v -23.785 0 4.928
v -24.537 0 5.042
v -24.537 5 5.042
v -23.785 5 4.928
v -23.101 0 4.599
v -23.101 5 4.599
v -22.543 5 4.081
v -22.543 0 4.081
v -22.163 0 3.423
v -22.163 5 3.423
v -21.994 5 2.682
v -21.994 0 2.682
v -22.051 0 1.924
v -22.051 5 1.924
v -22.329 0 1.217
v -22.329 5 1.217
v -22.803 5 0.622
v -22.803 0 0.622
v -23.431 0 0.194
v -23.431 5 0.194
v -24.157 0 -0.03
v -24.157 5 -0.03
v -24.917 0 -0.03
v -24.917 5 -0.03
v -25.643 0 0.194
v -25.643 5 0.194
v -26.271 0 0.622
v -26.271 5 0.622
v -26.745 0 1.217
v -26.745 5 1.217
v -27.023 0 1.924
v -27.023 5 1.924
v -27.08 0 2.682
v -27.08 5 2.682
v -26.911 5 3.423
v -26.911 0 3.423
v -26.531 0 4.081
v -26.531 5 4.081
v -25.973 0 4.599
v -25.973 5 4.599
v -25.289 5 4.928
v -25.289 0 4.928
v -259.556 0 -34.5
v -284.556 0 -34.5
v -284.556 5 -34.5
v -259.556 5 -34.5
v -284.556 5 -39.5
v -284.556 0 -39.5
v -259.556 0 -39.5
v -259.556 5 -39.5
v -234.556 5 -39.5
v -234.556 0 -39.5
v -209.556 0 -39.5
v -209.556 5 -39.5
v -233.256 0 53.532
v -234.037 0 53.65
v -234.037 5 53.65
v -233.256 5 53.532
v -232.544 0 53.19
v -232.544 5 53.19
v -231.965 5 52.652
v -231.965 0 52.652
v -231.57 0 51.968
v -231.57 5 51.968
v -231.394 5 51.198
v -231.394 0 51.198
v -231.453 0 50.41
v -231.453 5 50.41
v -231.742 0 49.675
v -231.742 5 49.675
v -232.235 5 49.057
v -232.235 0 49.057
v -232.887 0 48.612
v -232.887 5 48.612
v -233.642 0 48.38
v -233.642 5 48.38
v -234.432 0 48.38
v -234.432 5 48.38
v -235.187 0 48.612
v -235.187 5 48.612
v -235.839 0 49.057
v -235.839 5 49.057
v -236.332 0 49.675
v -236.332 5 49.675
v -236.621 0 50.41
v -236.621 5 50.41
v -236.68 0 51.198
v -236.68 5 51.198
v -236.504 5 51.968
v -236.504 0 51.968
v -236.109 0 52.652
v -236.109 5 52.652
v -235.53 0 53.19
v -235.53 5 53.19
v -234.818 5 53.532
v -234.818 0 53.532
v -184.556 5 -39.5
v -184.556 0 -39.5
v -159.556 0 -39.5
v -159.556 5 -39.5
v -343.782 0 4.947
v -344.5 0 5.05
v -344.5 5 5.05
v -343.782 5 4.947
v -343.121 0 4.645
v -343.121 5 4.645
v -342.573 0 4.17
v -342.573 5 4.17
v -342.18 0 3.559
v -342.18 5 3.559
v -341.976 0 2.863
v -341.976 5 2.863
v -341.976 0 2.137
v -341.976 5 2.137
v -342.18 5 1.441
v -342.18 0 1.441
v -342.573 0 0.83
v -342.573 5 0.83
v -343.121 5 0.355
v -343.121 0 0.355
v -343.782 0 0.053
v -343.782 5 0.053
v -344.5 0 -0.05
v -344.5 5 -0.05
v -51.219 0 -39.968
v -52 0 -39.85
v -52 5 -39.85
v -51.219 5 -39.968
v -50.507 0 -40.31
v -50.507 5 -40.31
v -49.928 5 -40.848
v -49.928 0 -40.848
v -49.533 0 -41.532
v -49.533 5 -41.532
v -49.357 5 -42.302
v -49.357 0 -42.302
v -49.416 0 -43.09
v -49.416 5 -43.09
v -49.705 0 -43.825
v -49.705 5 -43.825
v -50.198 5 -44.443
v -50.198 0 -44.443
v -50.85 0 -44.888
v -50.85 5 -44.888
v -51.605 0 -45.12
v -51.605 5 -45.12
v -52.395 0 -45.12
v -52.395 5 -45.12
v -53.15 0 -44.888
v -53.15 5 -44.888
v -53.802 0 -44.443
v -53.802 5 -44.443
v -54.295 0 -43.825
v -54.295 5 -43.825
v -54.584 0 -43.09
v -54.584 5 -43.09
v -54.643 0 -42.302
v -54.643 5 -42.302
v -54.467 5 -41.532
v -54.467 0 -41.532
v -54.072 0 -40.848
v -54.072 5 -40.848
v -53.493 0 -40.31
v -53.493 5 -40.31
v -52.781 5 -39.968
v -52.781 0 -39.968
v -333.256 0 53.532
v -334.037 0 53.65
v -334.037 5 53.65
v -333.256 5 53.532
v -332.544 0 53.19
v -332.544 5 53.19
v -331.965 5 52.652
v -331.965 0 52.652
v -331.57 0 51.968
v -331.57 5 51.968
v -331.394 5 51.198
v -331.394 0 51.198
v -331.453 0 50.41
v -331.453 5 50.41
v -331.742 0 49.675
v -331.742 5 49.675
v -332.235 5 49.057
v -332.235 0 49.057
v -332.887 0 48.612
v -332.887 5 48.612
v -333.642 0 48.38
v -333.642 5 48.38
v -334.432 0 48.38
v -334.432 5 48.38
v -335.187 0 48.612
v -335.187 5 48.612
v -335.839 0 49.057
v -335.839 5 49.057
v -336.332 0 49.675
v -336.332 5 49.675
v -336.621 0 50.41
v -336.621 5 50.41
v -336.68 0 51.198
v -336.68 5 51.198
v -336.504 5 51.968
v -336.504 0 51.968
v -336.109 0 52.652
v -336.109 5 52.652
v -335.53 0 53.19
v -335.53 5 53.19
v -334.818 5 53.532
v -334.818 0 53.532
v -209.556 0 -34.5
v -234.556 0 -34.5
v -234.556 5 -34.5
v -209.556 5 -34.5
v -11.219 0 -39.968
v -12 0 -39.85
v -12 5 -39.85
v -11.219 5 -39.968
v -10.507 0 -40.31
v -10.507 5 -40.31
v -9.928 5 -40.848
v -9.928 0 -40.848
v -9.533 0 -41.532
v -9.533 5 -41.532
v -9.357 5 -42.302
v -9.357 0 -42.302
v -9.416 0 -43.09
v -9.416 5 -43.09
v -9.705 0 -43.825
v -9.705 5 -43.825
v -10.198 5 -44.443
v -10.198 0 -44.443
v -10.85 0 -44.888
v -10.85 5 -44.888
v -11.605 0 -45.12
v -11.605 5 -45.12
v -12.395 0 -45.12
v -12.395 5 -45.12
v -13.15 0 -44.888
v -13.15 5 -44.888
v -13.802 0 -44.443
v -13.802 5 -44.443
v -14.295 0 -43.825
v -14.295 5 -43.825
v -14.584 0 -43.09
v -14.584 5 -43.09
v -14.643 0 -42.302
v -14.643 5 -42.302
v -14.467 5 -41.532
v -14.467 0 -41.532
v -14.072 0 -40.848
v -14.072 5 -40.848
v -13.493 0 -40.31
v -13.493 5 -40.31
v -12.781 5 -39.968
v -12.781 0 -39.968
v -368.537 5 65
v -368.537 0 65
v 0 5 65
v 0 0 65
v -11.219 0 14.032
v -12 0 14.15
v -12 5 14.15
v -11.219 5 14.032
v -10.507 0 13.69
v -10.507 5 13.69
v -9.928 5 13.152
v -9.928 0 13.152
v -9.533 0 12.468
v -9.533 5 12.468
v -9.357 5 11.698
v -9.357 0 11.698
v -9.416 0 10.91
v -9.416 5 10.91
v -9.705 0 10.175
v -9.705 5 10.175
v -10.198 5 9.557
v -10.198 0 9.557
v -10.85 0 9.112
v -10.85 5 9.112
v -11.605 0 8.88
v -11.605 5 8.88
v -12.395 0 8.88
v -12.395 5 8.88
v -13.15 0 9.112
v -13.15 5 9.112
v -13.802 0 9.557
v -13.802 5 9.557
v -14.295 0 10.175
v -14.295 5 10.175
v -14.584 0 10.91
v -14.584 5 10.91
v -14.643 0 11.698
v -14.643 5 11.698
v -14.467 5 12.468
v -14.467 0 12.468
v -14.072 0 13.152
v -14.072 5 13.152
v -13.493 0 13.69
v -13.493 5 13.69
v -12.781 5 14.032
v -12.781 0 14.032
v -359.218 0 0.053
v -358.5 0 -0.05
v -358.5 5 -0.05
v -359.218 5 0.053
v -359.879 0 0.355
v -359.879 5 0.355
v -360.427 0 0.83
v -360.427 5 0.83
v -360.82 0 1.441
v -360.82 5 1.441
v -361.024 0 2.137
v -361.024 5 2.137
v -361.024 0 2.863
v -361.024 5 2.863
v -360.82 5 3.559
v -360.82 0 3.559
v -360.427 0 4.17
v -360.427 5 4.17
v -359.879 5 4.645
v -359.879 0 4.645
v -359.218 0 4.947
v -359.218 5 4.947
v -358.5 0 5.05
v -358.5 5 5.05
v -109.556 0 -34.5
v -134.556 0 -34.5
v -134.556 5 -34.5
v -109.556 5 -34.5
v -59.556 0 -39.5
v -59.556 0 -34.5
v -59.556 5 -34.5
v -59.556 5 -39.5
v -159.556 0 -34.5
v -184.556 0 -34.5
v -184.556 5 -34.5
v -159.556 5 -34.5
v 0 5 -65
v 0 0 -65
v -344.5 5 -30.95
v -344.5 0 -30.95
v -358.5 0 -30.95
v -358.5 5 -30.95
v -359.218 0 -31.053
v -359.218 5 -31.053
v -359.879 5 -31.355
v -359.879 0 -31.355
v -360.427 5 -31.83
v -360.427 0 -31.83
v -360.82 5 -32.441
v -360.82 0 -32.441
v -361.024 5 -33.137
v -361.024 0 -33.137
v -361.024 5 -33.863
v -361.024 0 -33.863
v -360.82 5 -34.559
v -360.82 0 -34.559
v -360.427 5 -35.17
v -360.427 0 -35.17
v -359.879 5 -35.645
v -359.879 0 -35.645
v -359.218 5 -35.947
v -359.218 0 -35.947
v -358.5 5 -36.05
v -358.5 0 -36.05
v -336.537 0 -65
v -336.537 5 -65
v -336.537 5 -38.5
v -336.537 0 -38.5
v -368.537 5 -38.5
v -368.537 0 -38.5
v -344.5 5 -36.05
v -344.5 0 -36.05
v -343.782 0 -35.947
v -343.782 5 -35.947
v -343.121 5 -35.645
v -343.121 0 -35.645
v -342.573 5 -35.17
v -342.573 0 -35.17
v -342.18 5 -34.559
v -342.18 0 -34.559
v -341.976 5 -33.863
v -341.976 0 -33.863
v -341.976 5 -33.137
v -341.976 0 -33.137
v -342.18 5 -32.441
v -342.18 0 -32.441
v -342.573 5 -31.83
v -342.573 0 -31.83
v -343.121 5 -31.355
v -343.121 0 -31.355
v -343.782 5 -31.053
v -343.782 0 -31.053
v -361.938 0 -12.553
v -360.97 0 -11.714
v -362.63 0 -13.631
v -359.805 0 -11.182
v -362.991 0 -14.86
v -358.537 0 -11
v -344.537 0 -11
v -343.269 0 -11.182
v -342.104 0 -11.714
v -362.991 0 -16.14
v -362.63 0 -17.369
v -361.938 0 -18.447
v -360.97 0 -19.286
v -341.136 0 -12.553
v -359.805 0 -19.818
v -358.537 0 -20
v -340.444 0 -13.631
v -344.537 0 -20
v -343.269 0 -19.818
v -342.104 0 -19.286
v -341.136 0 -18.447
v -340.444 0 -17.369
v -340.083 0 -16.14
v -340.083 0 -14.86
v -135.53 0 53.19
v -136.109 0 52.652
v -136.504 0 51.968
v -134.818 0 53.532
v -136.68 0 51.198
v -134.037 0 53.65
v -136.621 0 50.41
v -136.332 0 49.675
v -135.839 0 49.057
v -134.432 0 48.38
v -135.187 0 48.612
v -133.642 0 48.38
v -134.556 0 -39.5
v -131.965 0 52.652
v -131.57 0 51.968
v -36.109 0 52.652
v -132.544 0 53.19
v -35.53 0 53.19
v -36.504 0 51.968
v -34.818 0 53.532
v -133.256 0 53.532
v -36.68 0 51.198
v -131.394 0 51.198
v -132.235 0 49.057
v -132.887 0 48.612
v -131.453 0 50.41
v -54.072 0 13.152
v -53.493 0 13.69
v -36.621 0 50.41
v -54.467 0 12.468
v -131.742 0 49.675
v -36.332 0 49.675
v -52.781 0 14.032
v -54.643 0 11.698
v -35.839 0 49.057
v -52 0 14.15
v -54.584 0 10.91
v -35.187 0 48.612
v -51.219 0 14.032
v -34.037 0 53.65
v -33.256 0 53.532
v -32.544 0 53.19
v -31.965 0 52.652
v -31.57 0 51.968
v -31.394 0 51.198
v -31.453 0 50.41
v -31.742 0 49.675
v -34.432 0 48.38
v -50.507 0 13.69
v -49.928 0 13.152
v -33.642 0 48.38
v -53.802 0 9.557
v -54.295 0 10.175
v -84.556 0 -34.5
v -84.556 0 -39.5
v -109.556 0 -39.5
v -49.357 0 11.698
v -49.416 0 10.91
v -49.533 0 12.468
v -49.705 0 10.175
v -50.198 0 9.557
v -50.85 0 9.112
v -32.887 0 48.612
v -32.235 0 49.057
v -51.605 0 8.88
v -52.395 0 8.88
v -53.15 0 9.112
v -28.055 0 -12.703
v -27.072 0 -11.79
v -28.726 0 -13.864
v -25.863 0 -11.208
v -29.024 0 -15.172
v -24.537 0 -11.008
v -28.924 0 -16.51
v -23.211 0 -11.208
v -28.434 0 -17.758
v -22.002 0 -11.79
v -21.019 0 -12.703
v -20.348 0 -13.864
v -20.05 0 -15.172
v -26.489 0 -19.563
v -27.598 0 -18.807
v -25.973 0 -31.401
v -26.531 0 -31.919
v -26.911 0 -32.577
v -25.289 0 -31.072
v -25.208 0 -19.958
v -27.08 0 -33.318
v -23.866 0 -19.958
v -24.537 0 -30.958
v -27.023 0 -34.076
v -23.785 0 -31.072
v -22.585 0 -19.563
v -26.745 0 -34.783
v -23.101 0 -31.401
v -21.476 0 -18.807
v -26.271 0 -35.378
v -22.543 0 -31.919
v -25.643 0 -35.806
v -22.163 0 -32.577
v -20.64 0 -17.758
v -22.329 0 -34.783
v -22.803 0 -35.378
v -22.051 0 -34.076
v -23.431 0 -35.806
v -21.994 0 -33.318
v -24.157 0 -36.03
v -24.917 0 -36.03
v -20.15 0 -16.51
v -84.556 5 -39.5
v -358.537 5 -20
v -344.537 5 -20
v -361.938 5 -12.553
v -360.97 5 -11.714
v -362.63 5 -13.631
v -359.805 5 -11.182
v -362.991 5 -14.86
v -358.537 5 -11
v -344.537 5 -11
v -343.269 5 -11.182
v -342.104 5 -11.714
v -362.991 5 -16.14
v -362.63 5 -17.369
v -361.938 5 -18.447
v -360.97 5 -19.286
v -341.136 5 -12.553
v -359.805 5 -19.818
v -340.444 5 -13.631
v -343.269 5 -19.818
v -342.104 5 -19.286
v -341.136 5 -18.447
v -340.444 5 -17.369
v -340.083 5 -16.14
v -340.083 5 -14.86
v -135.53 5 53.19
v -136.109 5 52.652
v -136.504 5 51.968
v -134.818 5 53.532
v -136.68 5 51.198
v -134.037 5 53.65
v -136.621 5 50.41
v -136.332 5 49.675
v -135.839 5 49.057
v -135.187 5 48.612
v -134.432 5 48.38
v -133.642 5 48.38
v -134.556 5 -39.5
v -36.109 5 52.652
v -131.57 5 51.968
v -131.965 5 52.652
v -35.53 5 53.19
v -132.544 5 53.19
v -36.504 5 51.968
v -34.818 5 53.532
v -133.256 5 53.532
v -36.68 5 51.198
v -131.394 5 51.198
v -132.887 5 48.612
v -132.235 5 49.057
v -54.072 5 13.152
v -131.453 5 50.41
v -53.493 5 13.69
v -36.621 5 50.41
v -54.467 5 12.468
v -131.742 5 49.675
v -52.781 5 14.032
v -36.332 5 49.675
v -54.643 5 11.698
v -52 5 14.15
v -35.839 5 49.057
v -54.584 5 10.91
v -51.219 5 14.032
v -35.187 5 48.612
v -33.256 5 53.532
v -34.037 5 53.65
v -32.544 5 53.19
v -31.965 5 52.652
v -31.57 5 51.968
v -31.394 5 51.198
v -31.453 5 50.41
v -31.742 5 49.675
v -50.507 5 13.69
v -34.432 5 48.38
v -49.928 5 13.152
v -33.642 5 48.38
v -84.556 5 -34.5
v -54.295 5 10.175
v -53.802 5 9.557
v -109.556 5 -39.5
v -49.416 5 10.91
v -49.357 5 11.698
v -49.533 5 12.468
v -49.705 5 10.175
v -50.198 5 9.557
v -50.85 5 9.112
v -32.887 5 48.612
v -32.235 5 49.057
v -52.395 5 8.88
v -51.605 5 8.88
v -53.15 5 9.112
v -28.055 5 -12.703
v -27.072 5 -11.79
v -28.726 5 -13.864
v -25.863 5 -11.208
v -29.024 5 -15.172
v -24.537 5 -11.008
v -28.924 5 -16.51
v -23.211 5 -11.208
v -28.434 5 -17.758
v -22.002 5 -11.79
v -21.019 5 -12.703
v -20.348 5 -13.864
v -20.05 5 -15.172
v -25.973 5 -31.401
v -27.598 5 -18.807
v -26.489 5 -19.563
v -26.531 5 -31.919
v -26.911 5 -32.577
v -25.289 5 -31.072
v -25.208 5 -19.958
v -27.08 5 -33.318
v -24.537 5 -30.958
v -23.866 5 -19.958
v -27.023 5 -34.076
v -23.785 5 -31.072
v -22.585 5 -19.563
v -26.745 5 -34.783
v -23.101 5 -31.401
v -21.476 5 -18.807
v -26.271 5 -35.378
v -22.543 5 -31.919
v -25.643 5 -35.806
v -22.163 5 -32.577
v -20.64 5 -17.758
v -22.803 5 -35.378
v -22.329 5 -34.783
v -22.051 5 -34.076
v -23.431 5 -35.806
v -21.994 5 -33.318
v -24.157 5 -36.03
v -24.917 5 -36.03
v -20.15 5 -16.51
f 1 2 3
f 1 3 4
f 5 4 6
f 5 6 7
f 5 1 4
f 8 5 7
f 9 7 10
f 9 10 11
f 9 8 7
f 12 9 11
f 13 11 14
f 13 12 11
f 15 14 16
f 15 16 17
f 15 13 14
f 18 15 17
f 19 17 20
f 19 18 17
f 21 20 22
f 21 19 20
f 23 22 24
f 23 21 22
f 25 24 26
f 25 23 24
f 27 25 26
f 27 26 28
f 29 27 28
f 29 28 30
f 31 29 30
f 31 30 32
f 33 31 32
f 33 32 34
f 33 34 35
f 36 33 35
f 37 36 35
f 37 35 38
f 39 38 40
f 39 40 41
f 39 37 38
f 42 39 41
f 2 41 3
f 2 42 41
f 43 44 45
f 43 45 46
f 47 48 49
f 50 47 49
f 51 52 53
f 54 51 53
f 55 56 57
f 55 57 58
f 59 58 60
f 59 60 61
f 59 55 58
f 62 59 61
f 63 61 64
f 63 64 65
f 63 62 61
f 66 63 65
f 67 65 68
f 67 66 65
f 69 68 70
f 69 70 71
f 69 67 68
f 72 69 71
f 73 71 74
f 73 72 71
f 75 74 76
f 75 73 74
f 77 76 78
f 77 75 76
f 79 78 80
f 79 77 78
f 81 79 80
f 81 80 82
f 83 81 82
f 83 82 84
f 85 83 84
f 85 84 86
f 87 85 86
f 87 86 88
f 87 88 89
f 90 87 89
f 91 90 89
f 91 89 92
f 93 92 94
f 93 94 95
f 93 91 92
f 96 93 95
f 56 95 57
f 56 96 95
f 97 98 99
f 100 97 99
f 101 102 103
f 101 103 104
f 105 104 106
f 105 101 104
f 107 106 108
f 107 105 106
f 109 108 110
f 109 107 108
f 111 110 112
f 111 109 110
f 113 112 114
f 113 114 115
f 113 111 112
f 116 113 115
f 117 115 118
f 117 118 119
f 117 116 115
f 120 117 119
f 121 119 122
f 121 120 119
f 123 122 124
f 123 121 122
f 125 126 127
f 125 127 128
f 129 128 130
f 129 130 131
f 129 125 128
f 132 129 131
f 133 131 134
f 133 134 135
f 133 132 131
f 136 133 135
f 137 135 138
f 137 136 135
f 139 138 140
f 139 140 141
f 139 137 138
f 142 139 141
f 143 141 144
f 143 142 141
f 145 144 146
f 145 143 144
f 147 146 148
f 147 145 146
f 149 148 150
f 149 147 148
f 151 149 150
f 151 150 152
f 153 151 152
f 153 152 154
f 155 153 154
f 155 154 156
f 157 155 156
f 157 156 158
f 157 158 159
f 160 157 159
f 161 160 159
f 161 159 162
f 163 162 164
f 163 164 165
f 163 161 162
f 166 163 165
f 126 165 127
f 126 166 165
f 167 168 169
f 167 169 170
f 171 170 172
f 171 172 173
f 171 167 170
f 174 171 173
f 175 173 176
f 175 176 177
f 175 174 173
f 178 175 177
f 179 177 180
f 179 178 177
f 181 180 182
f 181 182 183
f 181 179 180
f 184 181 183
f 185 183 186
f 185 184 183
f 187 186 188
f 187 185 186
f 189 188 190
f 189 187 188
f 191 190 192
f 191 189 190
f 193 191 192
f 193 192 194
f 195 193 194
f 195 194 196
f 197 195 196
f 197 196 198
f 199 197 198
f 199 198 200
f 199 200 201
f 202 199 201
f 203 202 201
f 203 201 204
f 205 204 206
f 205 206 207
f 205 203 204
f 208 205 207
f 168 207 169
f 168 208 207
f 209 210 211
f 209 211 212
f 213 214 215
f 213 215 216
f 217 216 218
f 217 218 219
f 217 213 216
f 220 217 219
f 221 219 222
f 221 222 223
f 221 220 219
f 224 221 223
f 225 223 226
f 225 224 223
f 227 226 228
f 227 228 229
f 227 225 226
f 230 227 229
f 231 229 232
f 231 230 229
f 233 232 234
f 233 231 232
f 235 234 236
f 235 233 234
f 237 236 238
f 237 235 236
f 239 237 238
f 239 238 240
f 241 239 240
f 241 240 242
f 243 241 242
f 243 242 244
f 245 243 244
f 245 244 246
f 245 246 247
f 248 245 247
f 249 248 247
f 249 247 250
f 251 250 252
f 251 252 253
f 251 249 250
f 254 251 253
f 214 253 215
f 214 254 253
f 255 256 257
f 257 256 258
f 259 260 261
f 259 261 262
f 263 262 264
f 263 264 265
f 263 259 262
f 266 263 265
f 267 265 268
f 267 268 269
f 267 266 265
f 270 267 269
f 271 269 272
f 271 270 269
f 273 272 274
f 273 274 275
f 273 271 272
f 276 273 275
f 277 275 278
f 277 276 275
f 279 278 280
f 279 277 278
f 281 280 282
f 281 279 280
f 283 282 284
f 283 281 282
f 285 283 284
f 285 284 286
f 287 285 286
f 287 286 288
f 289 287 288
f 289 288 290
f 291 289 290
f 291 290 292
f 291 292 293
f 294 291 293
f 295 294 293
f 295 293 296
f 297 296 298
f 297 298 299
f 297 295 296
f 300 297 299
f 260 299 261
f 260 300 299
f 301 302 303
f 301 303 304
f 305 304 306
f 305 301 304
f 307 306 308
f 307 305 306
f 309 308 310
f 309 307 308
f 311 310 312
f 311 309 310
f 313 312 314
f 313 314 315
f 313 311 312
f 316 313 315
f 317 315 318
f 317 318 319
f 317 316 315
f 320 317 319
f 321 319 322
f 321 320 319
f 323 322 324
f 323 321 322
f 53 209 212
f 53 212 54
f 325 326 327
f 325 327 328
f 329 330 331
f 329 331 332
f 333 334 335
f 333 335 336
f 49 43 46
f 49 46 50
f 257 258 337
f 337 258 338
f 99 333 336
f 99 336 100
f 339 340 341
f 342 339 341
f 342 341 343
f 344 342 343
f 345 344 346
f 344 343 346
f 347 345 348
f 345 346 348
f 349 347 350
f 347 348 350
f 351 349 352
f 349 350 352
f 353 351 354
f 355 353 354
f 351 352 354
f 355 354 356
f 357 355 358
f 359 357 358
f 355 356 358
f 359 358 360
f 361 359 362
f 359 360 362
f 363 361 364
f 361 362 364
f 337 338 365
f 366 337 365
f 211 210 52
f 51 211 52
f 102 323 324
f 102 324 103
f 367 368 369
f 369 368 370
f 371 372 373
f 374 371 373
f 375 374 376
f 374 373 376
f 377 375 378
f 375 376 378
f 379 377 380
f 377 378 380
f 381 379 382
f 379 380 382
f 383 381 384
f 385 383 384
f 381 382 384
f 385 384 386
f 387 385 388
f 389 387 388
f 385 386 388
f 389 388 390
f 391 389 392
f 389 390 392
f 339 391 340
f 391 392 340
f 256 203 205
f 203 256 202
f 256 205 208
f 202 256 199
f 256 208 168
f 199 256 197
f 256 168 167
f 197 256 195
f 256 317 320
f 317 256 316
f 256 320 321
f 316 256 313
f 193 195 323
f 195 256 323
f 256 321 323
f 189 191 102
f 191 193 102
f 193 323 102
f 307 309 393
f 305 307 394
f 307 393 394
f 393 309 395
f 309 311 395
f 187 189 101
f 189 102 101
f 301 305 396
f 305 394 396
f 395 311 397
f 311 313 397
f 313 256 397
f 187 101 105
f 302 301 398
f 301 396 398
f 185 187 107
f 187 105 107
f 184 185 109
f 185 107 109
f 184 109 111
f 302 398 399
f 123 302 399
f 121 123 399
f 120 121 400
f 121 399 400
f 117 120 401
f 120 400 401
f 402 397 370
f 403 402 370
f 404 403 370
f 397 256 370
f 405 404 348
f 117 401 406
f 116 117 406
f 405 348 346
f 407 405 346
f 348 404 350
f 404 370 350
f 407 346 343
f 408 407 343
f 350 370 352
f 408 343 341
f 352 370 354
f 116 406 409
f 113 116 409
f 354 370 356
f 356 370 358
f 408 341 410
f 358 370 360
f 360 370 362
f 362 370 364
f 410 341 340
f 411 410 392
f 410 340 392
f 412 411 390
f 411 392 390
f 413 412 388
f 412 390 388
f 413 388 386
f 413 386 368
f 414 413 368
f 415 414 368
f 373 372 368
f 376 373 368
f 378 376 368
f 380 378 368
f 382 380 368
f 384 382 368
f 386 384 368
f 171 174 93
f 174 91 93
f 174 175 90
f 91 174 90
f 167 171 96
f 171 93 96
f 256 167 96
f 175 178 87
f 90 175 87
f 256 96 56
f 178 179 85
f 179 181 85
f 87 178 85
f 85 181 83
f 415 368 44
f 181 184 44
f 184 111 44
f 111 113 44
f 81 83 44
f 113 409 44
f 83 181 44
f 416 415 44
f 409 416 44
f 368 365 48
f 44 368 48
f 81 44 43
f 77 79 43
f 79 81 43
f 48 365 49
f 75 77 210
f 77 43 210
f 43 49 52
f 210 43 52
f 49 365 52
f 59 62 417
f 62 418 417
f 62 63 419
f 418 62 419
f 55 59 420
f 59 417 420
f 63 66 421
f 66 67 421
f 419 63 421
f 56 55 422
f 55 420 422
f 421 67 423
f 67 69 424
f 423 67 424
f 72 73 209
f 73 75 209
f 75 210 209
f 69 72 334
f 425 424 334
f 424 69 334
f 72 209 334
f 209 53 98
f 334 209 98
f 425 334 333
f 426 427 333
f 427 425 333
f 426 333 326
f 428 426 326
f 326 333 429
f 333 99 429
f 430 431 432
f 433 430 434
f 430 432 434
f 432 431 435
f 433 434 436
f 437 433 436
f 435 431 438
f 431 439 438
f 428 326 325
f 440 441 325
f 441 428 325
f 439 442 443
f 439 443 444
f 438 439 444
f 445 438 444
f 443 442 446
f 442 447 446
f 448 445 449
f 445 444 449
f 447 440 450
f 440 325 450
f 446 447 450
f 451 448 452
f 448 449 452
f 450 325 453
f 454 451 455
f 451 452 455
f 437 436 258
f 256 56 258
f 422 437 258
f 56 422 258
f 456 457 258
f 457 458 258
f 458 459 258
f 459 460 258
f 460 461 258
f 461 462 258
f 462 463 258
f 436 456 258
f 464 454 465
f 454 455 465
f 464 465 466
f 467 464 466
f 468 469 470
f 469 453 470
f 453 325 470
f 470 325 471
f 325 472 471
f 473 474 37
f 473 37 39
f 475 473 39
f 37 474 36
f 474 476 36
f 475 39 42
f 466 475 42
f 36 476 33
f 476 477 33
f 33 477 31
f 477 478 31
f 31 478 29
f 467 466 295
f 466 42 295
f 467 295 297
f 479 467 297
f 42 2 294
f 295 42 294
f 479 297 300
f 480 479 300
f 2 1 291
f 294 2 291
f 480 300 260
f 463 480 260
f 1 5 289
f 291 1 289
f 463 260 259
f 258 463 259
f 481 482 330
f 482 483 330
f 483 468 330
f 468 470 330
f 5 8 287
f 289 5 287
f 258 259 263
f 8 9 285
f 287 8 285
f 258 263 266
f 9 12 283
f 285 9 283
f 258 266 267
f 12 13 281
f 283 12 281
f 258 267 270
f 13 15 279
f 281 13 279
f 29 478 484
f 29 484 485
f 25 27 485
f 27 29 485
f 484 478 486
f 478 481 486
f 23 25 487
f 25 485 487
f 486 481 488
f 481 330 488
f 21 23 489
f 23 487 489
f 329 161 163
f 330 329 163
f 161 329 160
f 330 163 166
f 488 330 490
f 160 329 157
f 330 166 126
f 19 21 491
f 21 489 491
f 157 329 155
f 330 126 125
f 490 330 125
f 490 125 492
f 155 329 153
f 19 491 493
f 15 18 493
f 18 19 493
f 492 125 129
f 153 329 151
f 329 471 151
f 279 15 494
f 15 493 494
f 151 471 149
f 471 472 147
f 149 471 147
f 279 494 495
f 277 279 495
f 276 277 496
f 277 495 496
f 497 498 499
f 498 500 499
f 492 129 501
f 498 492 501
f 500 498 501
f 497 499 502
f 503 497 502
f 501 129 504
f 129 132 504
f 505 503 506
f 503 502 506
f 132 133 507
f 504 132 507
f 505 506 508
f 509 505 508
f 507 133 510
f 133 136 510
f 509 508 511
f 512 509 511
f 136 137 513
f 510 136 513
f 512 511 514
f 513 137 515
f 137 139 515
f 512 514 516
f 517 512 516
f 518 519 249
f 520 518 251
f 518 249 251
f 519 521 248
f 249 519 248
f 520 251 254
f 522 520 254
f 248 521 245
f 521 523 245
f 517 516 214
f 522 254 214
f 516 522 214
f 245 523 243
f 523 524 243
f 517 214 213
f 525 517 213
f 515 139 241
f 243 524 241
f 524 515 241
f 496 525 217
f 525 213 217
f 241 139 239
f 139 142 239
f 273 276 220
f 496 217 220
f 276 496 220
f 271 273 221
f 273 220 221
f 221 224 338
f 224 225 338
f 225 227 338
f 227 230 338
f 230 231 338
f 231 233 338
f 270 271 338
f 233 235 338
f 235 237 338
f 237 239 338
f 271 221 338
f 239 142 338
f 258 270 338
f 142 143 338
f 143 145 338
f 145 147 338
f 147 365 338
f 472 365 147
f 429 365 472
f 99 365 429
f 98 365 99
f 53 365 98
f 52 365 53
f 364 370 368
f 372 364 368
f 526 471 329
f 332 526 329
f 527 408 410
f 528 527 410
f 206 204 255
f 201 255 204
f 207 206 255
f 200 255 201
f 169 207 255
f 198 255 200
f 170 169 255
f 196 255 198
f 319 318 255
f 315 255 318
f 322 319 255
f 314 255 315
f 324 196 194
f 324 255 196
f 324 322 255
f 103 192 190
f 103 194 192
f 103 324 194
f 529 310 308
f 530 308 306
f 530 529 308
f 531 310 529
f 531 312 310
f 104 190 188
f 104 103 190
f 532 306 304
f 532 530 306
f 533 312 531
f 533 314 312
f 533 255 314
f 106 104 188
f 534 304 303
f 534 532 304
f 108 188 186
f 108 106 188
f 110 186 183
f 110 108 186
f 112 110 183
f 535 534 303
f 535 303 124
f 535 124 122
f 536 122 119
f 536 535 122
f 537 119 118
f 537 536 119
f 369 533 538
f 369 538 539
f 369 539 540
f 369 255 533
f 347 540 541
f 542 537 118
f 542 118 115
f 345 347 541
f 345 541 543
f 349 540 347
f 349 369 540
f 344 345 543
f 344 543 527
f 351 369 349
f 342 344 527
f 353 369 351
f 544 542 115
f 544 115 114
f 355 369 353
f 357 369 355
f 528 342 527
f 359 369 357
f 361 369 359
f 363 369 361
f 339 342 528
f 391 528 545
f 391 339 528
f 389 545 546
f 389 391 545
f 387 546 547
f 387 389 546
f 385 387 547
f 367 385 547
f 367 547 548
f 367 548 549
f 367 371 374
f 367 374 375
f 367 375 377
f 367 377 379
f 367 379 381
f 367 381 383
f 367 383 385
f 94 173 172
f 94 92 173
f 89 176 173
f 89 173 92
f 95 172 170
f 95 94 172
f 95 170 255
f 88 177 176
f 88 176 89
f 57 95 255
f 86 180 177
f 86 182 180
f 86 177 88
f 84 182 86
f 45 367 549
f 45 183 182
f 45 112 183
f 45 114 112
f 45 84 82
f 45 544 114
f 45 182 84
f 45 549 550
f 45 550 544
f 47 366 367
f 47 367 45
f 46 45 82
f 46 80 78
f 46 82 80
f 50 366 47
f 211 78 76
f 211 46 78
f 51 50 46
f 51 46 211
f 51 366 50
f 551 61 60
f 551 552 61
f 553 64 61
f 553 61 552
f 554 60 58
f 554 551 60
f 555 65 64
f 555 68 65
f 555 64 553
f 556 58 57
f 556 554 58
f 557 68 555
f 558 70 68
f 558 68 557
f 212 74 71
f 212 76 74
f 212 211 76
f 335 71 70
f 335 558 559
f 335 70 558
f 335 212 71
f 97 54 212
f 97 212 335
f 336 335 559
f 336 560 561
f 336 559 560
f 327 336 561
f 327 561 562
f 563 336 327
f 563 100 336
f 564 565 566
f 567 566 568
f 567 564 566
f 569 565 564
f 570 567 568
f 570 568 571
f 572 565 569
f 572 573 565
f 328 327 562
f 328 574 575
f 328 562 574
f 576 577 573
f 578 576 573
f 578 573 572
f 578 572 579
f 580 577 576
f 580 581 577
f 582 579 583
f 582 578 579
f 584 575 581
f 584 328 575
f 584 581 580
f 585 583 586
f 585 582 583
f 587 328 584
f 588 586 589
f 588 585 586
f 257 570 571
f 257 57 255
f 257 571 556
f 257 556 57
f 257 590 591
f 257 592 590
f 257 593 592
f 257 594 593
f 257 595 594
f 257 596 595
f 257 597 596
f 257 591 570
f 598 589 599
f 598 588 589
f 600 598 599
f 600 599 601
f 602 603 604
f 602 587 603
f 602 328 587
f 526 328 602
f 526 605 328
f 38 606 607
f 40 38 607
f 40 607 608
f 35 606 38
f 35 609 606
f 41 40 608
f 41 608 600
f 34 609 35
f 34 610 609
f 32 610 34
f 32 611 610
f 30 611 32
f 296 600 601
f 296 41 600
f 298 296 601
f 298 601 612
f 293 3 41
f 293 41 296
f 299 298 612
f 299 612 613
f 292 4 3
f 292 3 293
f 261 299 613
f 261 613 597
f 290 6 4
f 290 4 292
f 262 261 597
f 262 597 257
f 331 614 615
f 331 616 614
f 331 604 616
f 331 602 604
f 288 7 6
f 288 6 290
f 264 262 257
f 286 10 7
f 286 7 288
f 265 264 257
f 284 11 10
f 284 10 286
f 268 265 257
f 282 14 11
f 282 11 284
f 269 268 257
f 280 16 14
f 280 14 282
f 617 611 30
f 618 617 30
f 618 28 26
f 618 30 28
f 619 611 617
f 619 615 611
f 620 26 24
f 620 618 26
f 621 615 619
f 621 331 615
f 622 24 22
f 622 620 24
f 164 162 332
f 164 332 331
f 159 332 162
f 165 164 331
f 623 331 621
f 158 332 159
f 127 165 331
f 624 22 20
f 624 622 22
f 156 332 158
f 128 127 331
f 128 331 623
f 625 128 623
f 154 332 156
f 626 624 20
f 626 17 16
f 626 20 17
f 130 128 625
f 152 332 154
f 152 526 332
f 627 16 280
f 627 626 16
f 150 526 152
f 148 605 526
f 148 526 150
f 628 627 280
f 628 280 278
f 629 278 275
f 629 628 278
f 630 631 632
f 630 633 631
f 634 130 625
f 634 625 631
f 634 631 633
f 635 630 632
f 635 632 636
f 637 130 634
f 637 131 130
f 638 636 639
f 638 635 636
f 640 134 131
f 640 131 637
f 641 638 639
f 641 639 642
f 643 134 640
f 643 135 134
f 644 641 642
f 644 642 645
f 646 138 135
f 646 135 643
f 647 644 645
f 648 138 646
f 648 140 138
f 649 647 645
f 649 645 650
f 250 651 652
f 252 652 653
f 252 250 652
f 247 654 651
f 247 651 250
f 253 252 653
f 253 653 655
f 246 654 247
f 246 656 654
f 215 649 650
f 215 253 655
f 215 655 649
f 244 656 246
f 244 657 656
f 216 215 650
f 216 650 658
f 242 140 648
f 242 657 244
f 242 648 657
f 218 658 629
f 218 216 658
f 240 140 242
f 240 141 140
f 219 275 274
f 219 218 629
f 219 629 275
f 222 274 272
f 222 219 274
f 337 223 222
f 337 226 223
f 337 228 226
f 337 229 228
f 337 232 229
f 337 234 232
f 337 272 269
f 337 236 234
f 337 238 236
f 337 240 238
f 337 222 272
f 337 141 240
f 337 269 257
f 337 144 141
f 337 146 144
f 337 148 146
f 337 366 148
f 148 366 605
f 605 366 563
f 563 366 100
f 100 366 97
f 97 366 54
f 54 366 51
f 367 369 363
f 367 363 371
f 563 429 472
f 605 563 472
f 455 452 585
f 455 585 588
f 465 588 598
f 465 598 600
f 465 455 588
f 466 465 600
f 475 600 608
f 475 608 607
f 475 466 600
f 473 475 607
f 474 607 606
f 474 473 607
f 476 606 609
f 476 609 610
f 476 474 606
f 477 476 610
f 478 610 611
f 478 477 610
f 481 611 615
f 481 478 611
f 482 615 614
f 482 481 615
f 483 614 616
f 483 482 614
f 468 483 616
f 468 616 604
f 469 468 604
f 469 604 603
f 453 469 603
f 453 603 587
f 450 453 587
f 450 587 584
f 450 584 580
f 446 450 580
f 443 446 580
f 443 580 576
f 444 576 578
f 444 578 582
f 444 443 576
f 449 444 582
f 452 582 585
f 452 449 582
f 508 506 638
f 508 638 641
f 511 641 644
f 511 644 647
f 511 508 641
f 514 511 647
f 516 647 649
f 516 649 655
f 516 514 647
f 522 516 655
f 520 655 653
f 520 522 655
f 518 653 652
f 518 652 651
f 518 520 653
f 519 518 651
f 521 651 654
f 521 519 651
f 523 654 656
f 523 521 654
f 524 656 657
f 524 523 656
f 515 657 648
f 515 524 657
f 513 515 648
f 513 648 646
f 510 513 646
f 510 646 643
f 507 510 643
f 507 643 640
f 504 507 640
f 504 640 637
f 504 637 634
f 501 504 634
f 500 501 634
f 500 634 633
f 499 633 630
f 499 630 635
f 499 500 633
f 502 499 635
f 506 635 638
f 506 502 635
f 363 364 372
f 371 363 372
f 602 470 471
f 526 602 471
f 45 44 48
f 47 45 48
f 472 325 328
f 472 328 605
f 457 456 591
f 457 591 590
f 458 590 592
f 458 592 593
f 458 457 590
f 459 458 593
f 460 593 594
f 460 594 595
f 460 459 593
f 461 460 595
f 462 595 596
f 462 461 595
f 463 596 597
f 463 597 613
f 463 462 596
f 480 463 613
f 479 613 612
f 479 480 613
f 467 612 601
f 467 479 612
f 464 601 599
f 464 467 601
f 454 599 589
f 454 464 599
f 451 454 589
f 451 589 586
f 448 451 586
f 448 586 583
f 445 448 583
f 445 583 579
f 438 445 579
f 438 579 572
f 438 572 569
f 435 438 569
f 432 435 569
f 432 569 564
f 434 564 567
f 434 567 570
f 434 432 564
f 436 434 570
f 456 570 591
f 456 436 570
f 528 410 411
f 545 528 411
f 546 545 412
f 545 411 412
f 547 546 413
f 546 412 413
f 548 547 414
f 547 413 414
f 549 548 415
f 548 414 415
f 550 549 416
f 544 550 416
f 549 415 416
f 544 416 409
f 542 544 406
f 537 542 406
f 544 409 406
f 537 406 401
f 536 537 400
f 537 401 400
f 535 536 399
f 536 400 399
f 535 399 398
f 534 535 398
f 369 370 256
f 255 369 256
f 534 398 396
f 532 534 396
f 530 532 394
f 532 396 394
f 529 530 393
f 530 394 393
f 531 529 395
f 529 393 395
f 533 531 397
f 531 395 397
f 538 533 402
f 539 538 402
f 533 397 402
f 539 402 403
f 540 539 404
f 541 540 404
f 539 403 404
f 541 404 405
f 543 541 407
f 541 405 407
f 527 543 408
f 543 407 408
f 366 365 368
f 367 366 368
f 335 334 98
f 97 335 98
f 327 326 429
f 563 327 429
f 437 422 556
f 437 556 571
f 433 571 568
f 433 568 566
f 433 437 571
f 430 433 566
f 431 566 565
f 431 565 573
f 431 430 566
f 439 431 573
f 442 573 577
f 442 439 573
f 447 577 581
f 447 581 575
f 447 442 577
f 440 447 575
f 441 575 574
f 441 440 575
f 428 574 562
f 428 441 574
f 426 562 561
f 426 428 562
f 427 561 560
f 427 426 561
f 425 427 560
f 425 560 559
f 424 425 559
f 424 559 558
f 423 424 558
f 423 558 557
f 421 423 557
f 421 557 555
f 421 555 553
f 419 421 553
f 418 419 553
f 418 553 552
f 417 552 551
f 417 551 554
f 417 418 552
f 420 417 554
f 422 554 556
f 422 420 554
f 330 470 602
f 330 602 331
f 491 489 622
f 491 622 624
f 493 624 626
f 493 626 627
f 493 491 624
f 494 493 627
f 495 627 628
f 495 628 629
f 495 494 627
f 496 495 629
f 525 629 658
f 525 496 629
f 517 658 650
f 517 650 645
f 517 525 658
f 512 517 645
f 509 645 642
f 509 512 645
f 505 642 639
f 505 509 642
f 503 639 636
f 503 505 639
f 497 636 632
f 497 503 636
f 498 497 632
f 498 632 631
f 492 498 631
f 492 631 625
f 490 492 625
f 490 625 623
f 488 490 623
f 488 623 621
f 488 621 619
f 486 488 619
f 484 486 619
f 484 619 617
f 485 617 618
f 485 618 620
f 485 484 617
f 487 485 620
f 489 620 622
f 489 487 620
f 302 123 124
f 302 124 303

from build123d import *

# Parameters (mm, degrees)
SKETCH1_R           = 2.65
SKETCH1_R_2         = 2.55
SKETCH1_R_3         = 4.5
SKETCH1_W           = 25
SKETCH1_H           = 5
BOSS_EXTRUDE1_DEPTH = 5


with BuildPart() as part:
    # Sketch1 → Boss-Extrude1 (new body)
    with BuildSketch(Plane(origin=(0, 0, 0), x_dir=(1, 0, 0), z_dir=(0, 1, 0))):
        Polygon((0, 0), (0, 40), (0, 65), (-336.537, 65), (-336.537, 38.5), (-368.537, 38.5), (-368.537, -65), (0, -65), align=None)
        with Locations(Location((-12, 42.5, 0), (0, 0, 270))):
            Circle(SKETCH1_R, mode=Mode.SUBTRACT)
        with Locations(Location((-24.537, 33.50840474, 0), (0, 0, 270))):
            Circle(SKETCH1_R_2, mode=Mode.SUBTRACT)
        with Locations(Location((-24.537, -2.49159526, 0), (0, 0, 270))):
            Circle(SKETCH1_R_2, mode=Mode.SUBTRACT)
        with Locations(Location((-24.537, 15.50840474, 0), (0, 0, 270))):
            Circle(SKETCH1_R_3, mode=Mode.SUBTRACT)
        with Locations(Location((-12, -11.5, 0), (0, 0, 270))):
            Circle(SKETCH1_R, mode=Mode.SUBTRACT)
        with Locations(Location((-334.037, -51, 0), (0, 0, 270))):
            Circle(SKETCH1_R, mode=Mode.SUBTRACT)
        with Locations(Location((-234.037, -51, 0), (0, 0, 270))):
            Circle(SKETCH1_R, mode=Mode.SUBTRACT)
        with Locations(Location((-134.037, -51, 0), (0, 0, 270))):
            Circle(SKETCH1_R, mode=Mode.SUBTRACT)
        with Locations(Location((-34.037, -51, 0), (0, 0, 270))):
            Circle(SKETCH1_R, mode=Mode.SUBTRACT)
        with Locations(Location((-52, -11.5, 0), (0, 0, 270))):
            Circle(SKETCH1_R, mode=Mode.SUBTRACT)
        with Locations(Location((-52, 42.5, 0), (0, 0, 270))):
            Circle(SKETCH1_R, mode=Mode.SUBTRACT)
        with BuildLine():
            Line((-358.537, 20), (-344.537, 20))
            ThreePointArc((-344.537, 20), (-340.037, 15.5), (-344.537, 11))
            Line((-344.537, 11), (-358.537, 11))
            ThreePointArc((-358.537, 11), (-363.037, 15.5), (-358.537, 20))
        make_face(mode=Mode.SUBTRACT)
        with BuildLine():
            Line((-344.5, 0.05), (-358.5, 0.05))
            ThreePointArc((-358.5, 0.05), (-361.05, -2.5), (-358.5, -5.05))
            Line((-358.5, -5.05), (-344.5, -5.05))
            ThreePointArc((-344.5, -5.05), (-341.95, -2.5), (-344.5, 0.05))
        make_face(mode=Mode.SUBTRACT)
        with Locations((-122.055571099, 37)):
            Rectangle(SKETCH1_W, SKETCH1_H, mode=Mode.SUBTRACT)
        with BuildLine():
            Line((-358.5, 36.05), (-344.5, 36.05))
            ThreePointArc((-344.5, 36.05), (-341.95, 33.5), (-344.5, 30.95))
            Line((-344.5, 30.95), (-358.5, 30.95))
            ThreePointArc((-358.5, 30.95), (-361.05, 33.5), (-358.5, 36.05))
        make_face(mode=Mode.SUBTRACT)
        with Locations((-72.055571099, 37)):
            Rectangle(SKETCH1_W, SKETCH1_H, mode=Mode.SUBTRACT)
        with Locations((-272.055571099, 37)):
            Rectangle(SKETCH1_W, SKETCH1_H, mode=Mode.SUBTRACT)
        with Locations((-222.055571099, 37)):
            Rectangle(SKETCH1_W, SKETCH1_H, mode=Mode.SUBTRACT)
        with Locations((-172.055571099, 37)):
            Rectangle(SKETCH1_W, SKETCH1_H, mode=Mode.SUBTRACT)
    extrude(amount=BOSS_EXTRUDE1_DEPTH)


solid = part.part
